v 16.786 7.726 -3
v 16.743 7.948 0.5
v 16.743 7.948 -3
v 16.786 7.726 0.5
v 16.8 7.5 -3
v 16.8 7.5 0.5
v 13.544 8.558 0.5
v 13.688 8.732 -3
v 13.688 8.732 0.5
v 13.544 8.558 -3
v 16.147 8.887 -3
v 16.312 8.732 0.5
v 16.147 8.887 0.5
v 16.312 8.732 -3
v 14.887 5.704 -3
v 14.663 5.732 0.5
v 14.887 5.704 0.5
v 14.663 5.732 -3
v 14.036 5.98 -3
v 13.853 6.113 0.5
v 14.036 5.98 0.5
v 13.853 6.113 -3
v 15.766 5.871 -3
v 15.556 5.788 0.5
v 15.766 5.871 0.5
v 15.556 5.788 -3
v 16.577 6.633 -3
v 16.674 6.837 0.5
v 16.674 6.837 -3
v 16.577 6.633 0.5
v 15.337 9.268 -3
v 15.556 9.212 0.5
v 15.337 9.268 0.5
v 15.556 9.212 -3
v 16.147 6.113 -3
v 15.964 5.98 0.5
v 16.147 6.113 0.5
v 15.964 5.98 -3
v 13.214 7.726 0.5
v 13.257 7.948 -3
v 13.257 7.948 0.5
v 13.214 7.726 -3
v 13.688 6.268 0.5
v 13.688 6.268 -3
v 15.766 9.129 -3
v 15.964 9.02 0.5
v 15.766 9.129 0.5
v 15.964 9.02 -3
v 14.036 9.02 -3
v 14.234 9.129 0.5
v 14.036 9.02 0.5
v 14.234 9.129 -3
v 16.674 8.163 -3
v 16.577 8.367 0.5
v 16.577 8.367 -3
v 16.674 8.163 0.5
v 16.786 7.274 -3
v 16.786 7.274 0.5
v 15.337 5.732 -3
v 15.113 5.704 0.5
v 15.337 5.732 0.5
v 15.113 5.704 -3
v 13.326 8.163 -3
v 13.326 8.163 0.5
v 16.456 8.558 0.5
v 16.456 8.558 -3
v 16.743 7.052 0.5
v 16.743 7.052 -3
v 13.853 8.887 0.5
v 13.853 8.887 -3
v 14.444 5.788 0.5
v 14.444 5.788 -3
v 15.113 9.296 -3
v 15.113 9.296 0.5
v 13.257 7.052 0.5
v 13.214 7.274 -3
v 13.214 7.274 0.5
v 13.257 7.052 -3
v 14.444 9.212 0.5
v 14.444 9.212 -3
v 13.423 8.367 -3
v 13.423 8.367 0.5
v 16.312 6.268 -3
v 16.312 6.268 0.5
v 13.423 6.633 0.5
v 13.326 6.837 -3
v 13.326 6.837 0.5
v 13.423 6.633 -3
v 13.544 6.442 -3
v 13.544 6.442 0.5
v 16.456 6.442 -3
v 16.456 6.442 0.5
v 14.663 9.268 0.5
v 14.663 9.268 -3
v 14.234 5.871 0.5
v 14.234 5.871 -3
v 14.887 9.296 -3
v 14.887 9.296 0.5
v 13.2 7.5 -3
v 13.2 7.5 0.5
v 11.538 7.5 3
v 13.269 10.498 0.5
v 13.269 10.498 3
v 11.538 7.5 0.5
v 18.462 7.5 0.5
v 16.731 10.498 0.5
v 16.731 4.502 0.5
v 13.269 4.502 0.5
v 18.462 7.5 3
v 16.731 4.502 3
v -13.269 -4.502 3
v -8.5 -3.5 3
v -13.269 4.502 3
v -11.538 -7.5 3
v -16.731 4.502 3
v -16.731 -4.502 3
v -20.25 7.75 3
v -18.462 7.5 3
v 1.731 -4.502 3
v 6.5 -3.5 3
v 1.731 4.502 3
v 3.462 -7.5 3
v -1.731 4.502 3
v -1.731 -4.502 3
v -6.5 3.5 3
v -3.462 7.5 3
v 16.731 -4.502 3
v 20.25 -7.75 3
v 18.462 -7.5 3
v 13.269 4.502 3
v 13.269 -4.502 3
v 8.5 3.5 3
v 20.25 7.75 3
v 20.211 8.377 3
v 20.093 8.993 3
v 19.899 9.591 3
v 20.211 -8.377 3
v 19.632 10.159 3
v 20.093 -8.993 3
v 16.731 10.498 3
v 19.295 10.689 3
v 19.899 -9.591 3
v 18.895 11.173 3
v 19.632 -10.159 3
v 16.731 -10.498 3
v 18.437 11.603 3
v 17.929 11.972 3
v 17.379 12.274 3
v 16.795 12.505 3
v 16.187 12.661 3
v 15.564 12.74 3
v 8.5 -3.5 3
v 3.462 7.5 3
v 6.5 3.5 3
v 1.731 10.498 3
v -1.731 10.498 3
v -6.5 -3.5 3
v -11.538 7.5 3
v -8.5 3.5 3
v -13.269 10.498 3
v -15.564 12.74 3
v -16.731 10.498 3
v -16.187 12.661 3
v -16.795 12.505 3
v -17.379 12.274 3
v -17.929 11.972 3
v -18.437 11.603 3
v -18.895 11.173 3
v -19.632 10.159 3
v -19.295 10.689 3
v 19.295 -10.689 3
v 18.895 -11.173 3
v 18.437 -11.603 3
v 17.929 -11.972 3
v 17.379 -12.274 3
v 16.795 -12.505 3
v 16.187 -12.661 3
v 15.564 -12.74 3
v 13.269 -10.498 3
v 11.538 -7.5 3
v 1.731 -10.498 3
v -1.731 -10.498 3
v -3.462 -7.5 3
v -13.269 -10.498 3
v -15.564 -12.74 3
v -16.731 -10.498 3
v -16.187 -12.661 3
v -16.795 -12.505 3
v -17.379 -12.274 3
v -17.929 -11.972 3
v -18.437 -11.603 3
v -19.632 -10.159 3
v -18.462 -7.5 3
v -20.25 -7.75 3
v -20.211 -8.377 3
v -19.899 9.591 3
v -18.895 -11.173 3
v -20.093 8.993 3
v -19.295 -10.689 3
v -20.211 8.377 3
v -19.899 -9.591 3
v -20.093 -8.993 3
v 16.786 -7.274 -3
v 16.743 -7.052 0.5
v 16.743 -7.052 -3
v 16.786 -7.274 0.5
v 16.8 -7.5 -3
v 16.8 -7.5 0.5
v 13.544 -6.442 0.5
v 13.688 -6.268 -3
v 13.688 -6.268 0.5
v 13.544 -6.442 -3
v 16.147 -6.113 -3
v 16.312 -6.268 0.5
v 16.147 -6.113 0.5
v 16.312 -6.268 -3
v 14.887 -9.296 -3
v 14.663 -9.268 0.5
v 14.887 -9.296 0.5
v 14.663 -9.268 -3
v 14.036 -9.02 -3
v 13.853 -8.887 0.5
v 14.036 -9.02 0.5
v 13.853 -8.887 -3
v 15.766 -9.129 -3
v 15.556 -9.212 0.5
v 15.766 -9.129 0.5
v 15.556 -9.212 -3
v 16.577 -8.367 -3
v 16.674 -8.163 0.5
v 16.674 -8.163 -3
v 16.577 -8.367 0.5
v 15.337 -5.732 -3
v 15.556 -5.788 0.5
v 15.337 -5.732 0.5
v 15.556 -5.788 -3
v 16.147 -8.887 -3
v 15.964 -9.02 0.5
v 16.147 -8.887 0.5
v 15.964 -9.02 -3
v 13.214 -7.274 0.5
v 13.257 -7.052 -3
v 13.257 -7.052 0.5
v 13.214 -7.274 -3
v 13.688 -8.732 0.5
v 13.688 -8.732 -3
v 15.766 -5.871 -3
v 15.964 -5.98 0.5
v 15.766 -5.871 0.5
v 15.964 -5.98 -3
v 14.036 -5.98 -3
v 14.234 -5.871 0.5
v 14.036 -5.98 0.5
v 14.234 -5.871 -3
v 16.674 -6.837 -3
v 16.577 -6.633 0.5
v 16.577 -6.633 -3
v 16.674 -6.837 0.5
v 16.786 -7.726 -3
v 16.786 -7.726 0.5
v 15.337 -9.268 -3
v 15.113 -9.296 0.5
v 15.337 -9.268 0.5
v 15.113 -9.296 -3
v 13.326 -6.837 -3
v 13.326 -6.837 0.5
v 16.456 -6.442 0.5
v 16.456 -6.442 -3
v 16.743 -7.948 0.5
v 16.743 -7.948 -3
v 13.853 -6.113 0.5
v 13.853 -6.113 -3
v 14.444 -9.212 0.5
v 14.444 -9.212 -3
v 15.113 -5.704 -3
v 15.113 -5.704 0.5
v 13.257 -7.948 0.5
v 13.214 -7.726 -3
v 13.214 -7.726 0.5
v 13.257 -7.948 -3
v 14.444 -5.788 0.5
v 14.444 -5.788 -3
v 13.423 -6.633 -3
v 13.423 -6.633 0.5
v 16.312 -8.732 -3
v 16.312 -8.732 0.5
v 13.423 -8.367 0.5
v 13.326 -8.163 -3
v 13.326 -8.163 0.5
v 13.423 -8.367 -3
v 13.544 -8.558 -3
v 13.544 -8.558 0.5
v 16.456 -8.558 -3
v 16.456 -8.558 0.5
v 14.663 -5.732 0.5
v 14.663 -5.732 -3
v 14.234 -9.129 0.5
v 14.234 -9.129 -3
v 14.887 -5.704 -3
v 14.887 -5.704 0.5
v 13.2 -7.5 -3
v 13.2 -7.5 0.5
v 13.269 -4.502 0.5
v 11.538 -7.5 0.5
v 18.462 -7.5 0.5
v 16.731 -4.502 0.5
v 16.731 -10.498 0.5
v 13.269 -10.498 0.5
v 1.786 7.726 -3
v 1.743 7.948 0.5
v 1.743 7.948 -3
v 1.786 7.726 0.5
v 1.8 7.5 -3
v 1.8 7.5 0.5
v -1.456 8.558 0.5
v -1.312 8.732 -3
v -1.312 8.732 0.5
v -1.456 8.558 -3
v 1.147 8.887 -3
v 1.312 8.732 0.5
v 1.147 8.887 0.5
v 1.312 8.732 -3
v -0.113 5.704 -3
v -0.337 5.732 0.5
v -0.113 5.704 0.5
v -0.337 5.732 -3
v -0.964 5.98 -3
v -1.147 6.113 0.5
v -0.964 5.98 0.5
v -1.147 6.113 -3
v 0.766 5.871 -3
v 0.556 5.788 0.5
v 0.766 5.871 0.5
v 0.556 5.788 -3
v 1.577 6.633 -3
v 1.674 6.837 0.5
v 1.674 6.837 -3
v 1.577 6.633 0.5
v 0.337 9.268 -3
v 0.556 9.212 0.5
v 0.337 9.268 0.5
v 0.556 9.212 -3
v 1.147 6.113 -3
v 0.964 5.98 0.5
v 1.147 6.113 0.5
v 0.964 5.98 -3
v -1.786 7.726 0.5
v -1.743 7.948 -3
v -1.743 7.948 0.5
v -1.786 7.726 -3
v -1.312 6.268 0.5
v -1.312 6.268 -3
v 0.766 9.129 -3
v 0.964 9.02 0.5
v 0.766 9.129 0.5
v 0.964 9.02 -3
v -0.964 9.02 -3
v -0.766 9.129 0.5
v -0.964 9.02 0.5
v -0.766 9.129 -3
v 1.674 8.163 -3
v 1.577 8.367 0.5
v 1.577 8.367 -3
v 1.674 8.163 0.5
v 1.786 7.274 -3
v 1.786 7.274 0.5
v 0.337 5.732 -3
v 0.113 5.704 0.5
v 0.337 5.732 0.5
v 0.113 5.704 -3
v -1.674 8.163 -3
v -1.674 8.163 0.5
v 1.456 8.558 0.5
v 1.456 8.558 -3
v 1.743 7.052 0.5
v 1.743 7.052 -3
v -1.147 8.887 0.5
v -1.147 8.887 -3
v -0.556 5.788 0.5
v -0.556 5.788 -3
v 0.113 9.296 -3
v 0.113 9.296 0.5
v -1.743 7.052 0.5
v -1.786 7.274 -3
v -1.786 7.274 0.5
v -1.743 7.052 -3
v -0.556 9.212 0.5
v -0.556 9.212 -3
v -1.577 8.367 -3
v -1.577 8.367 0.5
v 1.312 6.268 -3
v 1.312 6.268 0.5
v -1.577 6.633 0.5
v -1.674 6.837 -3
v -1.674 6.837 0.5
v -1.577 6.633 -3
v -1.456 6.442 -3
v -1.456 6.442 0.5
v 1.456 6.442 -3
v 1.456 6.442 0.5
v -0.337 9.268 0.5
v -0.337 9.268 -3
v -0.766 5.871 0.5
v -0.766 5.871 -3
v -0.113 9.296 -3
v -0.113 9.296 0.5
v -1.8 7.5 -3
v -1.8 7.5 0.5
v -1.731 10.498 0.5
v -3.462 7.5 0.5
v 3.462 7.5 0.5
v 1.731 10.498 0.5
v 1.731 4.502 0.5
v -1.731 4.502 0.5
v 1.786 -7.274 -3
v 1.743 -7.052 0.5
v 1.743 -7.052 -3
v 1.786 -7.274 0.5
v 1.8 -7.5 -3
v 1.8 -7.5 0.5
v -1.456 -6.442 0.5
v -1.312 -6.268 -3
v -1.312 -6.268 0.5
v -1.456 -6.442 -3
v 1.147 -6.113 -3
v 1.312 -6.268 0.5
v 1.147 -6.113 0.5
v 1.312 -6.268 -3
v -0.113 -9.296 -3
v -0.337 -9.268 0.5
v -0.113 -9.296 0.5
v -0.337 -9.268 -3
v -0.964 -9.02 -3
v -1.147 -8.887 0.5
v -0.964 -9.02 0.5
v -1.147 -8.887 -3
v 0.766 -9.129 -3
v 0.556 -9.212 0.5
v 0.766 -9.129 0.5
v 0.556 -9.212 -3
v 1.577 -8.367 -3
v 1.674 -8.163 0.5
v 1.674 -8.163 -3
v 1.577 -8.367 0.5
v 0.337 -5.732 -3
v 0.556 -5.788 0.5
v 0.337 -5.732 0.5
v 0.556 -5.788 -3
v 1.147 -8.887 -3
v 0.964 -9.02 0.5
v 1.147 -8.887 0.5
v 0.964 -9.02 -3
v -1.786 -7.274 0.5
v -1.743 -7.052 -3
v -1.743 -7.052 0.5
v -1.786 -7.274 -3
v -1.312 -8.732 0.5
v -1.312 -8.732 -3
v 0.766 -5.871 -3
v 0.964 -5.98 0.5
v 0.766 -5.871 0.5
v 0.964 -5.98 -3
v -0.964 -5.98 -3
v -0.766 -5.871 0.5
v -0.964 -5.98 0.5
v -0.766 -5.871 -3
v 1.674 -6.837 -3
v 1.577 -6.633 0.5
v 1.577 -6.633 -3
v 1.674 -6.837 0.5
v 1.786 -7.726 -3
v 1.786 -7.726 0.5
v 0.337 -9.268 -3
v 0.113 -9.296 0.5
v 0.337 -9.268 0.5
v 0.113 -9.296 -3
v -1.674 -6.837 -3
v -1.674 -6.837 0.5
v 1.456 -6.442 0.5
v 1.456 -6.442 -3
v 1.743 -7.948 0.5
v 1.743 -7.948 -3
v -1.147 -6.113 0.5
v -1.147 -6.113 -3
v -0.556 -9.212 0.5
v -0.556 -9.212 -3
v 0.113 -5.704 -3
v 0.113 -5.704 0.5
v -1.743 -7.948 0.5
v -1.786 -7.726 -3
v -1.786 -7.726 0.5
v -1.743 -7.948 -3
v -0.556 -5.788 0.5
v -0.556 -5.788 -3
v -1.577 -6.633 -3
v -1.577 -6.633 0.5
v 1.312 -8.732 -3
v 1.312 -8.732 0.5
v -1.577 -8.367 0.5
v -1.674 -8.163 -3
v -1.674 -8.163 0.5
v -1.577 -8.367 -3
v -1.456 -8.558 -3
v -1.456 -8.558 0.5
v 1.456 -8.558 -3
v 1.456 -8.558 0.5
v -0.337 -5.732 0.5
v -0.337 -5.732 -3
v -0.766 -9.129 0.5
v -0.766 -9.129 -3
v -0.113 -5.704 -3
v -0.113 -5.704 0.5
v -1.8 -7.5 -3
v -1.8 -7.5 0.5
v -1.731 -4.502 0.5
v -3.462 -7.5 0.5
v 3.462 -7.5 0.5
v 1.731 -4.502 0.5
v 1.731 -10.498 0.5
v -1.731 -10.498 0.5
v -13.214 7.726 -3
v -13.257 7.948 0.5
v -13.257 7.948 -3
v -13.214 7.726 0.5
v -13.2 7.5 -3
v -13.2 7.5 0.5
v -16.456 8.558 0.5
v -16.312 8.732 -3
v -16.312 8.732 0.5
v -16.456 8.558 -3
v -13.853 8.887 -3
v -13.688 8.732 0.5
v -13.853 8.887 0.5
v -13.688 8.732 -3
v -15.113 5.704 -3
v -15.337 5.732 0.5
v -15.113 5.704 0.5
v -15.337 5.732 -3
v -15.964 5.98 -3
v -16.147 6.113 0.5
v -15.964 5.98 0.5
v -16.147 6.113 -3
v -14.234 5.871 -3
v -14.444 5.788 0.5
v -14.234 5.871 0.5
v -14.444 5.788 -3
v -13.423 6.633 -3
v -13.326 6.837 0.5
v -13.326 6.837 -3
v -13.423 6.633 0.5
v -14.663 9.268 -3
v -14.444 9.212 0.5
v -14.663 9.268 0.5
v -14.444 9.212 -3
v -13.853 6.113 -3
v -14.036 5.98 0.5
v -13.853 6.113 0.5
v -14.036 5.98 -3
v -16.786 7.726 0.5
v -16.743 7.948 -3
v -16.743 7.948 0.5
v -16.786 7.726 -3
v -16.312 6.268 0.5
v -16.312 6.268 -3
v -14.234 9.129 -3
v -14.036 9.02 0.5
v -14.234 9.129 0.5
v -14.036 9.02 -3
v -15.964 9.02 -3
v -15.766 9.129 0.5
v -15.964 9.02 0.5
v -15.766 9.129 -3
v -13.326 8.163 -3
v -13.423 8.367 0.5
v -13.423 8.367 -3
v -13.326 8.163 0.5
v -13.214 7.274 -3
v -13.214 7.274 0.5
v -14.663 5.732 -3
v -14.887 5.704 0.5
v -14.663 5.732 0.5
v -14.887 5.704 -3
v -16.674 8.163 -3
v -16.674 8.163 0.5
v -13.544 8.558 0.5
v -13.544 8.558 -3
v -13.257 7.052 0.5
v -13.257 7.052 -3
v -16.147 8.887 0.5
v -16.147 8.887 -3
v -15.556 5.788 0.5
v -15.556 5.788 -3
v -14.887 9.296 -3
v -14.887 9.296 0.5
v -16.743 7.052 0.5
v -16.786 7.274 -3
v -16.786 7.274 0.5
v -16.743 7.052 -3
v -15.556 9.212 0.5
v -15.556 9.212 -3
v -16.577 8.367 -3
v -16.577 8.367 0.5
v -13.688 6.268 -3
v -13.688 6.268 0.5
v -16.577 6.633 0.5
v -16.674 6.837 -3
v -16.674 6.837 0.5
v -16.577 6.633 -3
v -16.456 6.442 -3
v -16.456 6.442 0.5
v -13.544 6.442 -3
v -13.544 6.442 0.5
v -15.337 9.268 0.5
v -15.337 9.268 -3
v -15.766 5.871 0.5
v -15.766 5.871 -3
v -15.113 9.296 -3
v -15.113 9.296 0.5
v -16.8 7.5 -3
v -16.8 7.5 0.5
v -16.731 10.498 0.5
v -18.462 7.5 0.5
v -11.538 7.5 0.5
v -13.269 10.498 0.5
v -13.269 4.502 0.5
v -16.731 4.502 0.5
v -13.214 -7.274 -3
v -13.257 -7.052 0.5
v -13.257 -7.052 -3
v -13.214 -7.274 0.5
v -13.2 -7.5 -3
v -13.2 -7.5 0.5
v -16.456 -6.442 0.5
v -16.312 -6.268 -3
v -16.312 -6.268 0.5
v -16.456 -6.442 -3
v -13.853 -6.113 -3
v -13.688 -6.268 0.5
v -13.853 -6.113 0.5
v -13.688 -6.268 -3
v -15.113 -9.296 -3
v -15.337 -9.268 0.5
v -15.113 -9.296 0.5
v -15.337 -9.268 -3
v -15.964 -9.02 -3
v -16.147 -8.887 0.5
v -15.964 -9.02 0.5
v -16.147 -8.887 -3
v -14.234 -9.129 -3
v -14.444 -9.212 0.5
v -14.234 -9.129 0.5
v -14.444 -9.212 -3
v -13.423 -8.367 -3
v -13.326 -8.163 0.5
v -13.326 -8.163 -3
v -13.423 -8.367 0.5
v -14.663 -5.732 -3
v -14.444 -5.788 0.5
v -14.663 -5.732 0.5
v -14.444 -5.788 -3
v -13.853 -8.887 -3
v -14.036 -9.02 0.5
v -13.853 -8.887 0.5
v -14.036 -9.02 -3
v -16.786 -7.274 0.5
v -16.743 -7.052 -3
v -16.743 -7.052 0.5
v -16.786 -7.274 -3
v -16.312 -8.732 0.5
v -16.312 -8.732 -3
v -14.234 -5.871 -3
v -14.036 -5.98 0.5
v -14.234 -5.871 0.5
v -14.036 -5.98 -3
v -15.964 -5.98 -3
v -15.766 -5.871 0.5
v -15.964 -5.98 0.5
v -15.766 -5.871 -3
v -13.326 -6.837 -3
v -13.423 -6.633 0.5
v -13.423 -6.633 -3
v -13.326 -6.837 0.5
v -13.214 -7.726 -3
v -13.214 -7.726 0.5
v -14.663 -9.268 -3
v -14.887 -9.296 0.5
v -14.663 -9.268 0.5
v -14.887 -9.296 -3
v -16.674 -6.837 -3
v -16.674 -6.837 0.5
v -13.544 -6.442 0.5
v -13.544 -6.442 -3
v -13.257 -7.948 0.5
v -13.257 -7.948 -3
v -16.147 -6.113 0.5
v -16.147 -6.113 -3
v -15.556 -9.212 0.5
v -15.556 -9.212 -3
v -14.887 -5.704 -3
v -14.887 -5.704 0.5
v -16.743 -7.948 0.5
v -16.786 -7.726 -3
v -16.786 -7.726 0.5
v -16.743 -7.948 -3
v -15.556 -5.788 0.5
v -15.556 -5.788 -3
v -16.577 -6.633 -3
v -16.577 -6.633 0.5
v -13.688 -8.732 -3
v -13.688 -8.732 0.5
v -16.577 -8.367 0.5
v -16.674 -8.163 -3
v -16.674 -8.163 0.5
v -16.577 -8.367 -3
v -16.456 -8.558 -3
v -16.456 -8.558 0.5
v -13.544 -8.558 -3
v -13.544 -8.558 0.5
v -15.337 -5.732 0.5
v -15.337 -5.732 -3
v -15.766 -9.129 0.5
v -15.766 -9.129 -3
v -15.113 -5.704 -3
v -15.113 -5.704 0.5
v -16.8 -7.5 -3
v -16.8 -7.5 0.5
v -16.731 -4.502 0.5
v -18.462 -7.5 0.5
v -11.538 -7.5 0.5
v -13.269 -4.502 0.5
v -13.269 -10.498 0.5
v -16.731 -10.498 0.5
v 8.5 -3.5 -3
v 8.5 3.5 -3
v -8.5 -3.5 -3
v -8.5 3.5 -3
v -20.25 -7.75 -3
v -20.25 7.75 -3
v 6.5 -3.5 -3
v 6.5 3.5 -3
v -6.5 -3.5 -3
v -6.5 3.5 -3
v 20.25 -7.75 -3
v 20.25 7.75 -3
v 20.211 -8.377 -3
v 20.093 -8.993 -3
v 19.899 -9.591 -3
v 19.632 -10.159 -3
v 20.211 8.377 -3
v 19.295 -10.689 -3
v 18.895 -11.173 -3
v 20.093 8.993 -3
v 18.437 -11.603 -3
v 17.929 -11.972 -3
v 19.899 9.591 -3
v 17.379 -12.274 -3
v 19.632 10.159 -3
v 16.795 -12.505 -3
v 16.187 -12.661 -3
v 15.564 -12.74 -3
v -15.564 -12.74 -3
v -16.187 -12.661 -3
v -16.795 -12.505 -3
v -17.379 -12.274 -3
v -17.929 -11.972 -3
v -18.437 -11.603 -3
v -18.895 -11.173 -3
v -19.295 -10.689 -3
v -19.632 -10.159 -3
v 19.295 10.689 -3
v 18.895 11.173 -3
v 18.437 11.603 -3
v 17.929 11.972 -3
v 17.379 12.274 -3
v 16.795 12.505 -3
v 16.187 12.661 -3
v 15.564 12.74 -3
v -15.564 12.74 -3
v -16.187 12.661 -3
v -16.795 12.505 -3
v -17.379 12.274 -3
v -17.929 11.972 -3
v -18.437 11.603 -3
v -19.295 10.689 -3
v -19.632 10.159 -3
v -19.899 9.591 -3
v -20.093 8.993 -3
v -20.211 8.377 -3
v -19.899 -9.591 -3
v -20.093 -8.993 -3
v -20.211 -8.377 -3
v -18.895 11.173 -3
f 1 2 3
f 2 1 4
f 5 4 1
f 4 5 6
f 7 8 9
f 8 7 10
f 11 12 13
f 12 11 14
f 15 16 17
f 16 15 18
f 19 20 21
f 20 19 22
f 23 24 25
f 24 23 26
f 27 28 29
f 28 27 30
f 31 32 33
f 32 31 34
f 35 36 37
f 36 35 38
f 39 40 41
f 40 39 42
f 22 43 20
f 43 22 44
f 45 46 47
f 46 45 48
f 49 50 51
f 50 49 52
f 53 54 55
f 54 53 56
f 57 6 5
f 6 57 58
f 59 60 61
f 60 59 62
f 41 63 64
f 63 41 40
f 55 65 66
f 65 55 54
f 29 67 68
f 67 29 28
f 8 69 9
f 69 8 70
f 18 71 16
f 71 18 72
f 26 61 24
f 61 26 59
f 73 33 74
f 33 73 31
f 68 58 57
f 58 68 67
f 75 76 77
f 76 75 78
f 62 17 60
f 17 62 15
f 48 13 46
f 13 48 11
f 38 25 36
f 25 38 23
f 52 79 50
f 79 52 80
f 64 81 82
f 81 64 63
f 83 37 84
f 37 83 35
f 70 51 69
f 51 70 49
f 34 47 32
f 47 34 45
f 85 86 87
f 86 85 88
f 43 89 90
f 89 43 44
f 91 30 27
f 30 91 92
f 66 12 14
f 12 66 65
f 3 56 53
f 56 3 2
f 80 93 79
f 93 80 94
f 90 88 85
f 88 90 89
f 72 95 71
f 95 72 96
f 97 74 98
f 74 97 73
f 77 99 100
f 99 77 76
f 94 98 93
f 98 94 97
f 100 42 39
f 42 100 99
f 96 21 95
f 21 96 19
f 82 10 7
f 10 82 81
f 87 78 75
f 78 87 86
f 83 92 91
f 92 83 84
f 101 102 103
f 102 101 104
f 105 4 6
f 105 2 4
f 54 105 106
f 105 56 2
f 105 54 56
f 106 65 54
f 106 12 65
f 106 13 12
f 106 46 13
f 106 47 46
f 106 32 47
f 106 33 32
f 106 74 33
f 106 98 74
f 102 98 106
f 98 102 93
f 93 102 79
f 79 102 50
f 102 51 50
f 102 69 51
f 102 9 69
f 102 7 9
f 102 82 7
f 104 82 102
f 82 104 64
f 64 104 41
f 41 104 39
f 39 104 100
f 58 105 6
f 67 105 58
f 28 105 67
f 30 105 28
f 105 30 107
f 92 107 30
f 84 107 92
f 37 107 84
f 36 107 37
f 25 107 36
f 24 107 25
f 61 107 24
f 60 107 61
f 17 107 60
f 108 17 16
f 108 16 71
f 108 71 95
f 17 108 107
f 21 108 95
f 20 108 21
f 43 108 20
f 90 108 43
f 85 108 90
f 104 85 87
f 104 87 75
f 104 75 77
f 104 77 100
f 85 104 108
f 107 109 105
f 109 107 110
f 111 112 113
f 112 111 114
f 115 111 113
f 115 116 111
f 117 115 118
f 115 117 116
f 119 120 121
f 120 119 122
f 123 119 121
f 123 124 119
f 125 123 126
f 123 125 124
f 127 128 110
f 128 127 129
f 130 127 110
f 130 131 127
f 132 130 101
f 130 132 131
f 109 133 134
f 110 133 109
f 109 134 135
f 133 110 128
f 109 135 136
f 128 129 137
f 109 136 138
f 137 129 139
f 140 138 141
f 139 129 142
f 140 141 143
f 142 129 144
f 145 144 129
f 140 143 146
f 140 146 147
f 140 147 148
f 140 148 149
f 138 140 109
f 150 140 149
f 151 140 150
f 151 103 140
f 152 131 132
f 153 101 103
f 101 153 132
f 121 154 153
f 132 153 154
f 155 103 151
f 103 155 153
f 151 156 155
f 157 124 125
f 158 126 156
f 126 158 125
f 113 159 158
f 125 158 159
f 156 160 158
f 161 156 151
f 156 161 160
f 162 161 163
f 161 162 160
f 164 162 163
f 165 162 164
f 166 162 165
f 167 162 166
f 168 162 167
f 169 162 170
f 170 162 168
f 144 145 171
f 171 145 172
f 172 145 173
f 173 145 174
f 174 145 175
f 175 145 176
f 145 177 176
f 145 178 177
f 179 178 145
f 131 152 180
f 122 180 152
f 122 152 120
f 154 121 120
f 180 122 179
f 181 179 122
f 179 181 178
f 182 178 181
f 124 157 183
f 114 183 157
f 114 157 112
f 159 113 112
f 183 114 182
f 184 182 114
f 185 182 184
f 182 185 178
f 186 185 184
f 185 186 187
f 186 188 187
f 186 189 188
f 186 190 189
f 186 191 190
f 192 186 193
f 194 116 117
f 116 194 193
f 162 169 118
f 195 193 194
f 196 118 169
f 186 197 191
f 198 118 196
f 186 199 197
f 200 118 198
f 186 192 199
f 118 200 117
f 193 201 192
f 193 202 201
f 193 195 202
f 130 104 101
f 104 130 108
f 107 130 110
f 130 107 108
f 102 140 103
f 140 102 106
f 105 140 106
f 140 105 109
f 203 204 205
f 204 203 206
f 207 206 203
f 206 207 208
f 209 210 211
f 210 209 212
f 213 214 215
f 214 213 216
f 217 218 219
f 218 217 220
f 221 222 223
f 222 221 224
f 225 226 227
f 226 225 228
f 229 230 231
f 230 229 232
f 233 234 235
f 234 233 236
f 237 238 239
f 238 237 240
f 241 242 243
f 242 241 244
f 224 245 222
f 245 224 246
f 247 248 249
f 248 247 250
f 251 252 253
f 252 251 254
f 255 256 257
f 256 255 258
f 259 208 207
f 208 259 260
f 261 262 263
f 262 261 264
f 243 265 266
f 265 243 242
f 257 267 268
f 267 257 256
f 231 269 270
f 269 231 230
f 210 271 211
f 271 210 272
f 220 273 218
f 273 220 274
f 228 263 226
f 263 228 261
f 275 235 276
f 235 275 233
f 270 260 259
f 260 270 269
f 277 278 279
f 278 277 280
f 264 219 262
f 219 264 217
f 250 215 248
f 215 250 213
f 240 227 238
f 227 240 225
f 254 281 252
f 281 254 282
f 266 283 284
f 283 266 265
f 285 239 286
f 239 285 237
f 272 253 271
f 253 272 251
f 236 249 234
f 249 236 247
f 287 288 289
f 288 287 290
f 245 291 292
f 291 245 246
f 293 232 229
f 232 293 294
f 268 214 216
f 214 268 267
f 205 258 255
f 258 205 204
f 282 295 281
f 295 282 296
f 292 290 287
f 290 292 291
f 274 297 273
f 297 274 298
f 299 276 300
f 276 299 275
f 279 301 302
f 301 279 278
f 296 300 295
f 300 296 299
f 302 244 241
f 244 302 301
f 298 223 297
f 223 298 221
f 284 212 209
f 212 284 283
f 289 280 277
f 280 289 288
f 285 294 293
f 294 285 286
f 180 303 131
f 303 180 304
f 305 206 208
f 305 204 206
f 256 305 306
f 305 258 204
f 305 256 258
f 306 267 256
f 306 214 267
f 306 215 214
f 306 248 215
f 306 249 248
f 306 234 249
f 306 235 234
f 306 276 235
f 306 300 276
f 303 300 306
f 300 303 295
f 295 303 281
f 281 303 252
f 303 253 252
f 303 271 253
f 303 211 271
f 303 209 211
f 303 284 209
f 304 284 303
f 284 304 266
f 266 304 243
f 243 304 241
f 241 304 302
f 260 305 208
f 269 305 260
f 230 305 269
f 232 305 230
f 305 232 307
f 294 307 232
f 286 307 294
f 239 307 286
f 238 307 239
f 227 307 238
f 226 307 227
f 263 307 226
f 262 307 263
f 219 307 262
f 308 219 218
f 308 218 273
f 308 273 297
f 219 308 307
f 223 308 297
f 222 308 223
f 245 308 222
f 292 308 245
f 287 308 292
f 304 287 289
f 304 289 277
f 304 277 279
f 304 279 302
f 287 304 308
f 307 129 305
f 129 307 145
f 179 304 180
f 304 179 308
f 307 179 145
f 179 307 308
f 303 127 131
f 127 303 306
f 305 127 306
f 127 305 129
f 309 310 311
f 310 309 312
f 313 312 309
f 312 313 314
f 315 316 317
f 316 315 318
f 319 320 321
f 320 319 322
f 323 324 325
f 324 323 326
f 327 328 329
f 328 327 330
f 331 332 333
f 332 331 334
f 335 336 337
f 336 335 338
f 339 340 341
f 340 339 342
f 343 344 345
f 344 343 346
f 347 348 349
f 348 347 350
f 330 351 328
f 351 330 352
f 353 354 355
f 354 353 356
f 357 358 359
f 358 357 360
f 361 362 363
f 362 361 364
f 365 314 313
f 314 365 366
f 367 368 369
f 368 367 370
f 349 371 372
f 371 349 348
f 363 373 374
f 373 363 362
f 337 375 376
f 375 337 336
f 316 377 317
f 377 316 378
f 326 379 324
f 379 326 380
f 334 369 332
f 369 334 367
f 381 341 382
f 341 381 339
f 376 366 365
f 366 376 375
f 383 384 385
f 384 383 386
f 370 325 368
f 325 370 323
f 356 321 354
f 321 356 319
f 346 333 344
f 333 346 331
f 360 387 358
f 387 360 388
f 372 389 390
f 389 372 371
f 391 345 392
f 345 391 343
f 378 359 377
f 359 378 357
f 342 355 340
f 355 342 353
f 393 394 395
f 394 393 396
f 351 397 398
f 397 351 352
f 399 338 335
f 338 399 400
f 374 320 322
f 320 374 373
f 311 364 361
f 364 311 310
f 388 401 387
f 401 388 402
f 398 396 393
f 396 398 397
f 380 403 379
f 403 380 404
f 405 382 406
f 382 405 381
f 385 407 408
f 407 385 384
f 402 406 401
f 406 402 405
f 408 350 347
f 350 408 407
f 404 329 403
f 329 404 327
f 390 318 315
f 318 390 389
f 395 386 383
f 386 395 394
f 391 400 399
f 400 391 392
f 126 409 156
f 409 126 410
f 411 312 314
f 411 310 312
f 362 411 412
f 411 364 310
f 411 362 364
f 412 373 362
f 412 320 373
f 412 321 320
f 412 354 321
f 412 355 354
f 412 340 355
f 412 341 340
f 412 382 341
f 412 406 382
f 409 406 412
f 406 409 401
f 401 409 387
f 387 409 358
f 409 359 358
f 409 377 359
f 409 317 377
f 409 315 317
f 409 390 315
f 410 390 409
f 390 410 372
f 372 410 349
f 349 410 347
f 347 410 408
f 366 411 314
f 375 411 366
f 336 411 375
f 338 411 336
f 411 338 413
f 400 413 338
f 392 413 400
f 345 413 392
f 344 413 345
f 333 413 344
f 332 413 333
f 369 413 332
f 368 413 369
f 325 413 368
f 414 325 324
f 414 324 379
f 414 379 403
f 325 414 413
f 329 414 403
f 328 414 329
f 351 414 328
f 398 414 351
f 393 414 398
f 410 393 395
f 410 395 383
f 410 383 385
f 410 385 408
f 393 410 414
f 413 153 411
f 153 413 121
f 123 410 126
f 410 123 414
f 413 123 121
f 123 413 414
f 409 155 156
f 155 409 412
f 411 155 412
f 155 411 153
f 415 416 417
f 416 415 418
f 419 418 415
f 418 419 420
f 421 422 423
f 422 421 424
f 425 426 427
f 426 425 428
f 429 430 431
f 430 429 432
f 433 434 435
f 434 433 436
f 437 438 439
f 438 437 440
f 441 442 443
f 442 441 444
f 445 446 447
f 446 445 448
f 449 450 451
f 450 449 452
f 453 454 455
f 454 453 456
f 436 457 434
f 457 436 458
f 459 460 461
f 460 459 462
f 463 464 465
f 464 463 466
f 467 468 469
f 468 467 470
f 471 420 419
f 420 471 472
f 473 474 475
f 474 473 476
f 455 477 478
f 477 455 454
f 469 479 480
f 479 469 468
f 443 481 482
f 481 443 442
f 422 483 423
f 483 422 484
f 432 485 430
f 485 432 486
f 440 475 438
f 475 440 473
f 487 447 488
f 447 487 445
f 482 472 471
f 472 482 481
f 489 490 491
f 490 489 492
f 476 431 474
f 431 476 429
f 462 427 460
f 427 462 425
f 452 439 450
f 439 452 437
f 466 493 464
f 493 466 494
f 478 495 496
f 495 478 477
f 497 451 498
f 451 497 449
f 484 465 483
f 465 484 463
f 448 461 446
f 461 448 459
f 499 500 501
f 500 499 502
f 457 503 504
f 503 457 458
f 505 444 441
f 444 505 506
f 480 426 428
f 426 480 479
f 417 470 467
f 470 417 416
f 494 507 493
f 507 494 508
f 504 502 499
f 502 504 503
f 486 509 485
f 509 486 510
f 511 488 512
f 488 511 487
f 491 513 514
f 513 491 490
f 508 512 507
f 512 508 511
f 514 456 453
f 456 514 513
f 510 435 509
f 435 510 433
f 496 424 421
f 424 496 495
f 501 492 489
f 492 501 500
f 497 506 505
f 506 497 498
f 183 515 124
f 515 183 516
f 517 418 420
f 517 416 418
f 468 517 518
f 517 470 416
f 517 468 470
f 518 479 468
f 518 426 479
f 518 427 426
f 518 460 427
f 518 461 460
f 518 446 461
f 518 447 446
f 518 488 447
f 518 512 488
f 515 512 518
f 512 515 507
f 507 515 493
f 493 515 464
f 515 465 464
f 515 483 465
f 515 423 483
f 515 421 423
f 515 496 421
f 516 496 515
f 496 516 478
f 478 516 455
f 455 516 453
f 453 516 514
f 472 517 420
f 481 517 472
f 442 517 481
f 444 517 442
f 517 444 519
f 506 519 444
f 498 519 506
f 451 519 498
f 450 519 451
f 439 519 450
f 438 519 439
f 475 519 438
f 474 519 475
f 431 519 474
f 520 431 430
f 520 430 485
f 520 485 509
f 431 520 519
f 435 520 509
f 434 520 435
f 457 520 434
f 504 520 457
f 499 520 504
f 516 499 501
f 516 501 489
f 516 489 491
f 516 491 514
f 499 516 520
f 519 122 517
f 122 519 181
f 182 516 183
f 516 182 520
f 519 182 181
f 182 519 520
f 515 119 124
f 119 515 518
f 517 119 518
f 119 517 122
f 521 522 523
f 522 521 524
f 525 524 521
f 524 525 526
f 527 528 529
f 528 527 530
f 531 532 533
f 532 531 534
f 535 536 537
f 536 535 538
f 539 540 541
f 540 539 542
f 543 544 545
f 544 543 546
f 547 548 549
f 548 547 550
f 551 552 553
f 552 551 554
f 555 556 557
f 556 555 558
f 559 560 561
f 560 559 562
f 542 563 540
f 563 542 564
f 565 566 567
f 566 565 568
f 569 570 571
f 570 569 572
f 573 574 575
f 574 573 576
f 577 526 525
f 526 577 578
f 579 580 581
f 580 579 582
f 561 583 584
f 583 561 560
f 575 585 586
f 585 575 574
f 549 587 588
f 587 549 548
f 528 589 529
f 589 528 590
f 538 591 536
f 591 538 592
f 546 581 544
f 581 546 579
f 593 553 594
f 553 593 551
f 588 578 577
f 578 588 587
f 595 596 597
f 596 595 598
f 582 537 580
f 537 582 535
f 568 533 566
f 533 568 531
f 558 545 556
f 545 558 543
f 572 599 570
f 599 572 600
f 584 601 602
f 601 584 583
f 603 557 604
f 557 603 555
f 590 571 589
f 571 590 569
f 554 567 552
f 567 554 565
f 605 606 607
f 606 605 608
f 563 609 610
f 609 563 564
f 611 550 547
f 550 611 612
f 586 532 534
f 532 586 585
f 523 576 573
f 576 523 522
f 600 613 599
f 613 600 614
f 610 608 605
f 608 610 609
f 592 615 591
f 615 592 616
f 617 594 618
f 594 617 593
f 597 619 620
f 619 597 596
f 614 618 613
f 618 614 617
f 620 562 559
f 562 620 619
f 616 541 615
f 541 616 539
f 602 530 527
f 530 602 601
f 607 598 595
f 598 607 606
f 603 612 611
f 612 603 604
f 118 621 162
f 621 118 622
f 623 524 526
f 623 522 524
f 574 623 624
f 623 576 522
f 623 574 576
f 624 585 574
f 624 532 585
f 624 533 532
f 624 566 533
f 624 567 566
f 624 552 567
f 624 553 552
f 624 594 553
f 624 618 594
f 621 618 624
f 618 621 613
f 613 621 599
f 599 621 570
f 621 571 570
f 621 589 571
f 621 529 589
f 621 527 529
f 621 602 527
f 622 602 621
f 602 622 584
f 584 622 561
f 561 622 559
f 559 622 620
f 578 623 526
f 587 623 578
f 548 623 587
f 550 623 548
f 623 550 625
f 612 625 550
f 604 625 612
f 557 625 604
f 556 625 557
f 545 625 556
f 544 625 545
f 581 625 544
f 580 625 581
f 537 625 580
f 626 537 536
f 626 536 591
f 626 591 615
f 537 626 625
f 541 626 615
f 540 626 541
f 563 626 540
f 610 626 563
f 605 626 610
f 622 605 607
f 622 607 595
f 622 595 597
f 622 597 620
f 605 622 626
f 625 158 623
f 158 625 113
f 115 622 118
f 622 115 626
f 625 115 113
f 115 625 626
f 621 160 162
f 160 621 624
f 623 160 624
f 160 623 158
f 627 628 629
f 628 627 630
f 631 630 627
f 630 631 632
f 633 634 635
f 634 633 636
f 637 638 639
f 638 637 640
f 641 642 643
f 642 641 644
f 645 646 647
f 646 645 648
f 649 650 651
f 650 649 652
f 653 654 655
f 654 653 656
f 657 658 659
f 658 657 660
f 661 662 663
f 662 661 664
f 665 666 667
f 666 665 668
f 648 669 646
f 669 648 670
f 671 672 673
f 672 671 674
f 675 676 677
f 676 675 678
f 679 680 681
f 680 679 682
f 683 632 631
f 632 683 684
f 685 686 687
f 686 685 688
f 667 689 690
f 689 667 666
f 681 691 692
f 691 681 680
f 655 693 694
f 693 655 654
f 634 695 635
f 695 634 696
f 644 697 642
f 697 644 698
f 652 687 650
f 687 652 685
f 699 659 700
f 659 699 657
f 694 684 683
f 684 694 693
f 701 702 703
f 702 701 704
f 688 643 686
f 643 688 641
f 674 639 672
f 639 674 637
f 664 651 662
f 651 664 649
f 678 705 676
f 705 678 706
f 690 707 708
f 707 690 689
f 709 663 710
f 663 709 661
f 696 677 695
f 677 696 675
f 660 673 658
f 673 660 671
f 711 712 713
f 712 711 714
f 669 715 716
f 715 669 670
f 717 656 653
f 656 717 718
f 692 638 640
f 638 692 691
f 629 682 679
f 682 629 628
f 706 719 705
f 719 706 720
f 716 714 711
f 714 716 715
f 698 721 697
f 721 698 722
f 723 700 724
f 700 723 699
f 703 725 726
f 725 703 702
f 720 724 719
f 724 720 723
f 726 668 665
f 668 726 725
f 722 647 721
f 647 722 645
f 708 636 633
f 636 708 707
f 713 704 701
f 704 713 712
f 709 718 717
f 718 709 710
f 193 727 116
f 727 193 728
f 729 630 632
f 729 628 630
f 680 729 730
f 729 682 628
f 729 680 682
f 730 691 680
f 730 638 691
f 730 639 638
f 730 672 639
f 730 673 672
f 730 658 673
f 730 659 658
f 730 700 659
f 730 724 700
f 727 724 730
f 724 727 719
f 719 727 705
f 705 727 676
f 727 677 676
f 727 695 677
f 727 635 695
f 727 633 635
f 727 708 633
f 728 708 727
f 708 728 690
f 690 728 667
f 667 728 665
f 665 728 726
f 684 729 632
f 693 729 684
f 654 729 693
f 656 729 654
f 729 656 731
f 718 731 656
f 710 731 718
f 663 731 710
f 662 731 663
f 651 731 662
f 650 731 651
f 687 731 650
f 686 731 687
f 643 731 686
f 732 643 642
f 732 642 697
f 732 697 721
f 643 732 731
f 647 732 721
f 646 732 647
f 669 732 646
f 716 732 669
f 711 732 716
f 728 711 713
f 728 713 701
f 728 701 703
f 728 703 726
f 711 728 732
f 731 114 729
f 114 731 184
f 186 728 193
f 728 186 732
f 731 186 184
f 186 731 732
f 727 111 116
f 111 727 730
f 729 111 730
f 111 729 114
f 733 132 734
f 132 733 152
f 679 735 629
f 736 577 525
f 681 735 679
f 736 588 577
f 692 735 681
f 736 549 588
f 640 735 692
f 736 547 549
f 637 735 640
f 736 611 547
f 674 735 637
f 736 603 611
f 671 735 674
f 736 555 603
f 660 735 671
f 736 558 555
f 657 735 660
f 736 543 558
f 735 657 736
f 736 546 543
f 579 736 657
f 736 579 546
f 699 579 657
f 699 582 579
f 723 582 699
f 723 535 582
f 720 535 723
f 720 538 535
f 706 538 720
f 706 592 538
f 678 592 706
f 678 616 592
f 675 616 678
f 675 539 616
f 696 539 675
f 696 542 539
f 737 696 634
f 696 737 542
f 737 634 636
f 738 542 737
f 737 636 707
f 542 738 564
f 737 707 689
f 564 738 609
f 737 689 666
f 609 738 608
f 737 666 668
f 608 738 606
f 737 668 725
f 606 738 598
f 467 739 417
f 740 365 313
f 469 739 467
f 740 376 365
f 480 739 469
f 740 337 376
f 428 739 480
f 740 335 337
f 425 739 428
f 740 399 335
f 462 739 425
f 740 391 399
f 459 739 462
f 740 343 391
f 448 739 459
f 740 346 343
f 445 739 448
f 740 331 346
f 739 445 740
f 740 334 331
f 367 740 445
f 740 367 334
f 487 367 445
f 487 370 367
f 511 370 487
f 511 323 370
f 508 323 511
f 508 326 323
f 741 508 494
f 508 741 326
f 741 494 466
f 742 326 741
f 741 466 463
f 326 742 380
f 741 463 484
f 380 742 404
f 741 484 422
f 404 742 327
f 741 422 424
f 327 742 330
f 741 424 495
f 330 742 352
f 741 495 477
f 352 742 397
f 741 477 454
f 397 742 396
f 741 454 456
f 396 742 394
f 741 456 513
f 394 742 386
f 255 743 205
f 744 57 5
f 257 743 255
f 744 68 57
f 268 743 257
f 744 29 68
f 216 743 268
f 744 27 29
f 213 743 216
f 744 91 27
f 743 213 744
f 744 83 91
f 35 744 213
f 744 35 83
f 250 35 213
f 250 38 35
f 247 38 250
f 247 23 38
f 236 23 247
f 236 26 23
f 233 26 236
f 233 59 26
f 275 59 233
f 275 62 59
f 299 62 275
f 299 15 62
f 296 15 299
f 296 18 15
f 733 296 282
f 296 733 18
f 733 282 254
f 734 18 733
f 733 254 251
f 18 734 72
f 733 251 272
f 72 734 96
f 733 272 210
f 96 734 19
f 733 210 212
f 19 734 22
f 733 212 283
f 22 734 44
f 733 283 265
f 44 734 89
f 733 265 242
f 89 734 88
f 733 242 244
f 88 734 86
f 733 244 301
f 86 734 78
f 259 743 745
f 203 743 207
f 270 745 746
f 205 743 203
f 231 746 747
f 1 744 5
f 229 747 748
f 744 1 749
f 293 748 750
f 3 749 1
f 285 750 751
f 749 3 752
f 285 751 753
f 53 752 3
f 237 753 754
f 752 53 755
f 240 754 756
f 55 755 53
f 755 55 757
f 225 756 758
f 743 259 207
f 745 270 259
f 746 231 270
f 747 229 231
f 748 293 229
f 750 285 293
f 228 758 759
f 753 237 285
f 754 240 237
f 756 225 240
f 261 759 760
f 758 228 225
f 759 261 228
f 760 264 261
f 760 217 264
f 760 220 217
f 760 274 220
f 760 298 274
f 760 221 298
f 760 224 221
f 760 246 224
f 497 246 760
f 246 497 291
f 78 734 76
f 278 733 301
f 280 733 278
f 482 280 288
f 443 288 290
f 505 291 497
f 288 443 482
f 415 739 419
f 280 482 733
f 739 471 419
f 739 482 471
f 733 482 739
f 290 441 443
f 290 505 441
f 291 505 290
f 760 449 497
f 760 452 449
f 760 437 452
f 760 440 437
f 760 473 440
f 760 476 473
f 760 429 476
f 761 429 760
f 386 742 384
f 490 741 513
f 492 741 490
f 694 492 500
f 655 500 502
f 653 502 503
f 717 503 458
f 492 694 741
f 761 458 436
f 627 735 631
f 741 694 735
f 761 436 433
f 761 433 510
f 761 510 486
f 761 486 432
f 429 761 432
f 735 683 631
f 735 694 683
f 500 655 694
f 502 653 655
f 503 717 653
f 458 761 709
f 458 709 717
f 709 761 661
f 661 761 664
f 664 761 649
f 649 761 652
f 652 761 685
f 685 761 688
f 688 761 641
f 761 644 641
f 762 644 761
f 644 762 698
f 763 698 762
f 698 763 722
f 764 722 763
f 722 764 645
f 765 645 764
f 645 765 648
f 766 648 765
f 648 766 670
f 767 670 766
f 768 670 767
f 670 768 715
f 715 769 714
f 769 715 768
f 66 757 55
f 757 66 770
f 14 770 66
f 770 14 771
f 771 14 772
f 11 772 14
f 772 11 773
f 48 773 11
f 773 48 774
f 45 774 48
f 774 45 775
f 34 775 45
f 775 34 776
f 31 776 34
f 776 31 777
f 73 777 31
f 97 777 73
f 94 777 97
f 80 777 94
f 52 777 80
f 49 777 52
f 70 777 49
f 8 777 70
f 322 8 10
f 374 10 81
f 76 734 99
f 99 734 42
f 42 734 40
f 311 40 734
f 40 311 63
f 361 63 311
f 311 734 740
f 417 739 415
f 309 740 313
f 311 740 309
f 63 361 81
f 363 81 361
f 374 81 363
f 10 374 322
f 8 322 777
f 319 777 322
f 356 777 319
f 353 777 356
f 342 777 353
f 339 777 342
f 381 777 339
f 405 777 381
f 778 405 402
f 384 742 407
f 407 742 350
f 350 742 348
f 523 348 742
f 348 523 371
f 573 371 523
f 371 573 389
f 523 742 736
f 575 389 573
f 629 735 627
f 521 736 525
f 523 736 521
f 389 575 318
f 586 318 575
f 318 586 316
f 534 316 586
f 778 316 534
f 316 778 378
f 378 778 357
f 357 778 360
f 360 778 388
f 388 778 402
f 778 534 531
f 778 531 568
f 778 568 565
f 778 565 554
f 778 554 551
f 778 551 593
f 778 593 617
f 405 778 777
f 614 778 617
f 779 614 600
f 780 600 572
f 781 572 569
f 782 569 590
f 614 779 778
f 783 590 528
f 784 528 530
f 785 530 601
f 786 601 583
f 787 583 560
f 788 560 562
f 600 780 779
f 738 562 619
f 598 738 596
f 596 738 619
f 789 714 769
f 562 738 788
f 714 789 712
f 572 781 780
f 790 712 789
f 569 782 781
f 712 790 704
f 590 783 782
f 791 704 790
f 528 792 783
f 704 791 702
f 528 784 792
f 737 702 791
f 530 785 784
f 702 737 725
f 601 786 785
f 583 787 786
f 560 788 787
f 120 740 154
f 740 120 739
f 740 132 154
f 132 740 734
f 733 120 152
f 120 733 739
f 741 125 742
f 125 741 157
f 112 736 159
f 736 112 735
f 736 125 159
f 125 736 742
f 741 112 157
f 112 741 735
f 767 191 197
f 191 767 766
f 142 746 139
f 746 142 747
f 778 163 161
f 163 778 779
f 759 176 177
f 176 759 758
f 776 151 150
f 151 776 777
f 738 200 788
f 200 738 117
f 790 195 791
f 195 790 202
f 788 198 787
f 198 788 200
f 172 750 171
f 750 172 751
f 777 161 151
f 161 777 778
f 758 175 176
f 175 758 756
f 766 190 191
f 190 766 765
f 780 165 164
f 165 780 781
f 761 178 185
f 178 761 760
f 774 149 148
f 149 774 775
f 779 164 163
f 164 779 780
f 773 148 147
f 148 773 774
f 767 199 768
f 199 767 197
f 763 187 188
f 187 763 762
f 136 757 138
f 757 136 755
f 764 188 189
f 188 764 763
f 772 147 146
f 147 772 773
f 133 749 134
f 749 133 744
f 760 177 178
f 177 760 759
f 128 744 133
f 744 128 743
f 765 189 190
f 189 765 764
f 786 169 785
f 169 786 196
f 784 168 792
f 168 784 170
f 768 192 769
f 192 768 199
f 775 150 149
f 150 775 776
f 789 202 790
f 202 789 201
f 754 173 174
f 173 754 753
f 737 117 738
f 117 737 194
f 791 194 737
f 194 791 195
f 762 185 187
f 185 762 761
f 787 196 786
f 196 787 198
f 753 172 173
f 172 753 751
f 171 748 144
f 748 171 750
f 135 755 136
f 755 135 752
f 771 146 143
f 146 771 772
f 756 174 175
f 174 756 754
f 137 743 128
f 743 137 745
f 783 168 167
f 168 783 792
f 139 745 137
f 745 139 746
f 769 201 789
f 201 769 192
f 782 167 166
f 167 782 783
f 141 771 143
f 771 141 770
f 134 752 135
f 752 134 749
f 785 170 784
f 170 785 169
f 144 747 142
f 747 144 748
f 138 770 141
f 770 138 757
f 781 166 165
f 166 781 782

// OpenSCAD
$fn = 50;


difference() {
	union() {
		*color(alpha = 1.0000000000, c = "gray") {
			translate(v = [0, 14, -3.0000000000]) {
				linear_extrude(height = 1.5000000000) {
					text(font = "Arial:style=Bold", halign = "center", size = 4.5000000000, text = "COMMENT description rounded_rectangle_shape_p_type_0_0_-3.0_pos_timing_belt_clamp_gt2_extra_2.5_width_1.5_height_6_thickness_40.5_25.5_6_size", valign = "center");
				}
			}
		}
		translate(v = [0, 0, -3.0000000000]) {
			hull() {
				translate(v = [-15.2500000000, 7.7500000000, 0]) {
					cylinder(h = 6, r = 5);
				}
				translate(v = [15.2500000000, 7.7500000000, 0]) {
					cylinder(h = 6, r = 5);
				}
				translate(v = [-15.2500000000, -7.7500000000, 0]) {
					cylinder(h = 6, r = 5);
				}
				translate(v = [15.2500000000, -7.7500000000, 0]) {
					cylinder(h = 6, r = 5);
				}
			}
		}
	}
	union() {
		translate(v = [15, 7.5000000000, 3.0000000000]) {
			rotate(a = [0, 0, 0]) {
				difference() {
					union() {
						translate(v = [0, 0, -50.0000000000]) {
							cylinder(h = 100, r = 1.8000000000);
						}
						translate(v = [0, 0, -2.5000000000]) {
							linear_extrude(height = 2.5000000000) {
								polygon(points = [[3.4620000000, 0.0000000000], [1.7310000000, 2.9981799479], [-1.7310000000, 2.9981799479], [-3.4620000000, 0.0000000000], [-1.7310000000, -2.9981799479], [1.7310000000, -2.9981799479]]);
							}
						}
						translate(v = [0, 0, -50.0000000000]) {
							cylinder(h = 100, r = 1.8000000000);
						}
						translate(v = [0, 0, -50.0000000000]) {
							cylinder(h = 100, r = 1.8000000000);
						}
					}
					union();
				}
			}
		}
		translate(v = [15, -7.5000000000, 3.0000000000]) {
			rotate(a = [0, 0, 0]) {
				difference() {
					union() {
						translate(v = [0, 0, -50.0000000000]) {
							cylinder(h = 100, r = 1.8000000000);
						}
						translate(v = [0, 0, -2.5000000000]) {
							linear_extrude(height = 2.5000000000) {
								polygon(points = [[3.4620000000, 0.0000000000], [1.7310000000, 2.9981799479], [-1.7310000000, 2.9981799479], [-3.4620000000, 0.0000000000], [-1.7310000000, -2.9981799479], [1.7310000000, -2.9981799479]]);
							}
						}
						translate(v = [0, 0, -50.0000000000]) {
							cylinder(h = 100, r = 1.8000000000);
						}
						translate(v = [0, 0, -50.0000000000]) {
							cylinder(h = 100, r = 1.8000000000);
						}
					}
					union();
				}
			}
		}
		translate(v = [0, 7.5000000000, 3.0000000000]) {
			rotate(a = [0, 0, 0]) {
				difference() {
					union() {
						translate(v = [0, 0, -50.0000000000]) {
							cylinder(h = 100, r = 1.8000000000);
						}
						translate(v = [0, 0, -2.5000000000]) {
							linear_extrude(height = 2.5000000000) {
								polygon(points = [[3.4620000000, 0.0000000000], [1.7310000000, 2.9981799479], [-1.7310000000, 2.9981799479], [-3.4620000000, 0.0000000000], [-1.7310000000, -2.9981799479], [1.7310000000, -2.9981799479]]);
							}
						}
						translate(v = [0, 0, -50.0000000000]) {
							cylinder(h = 100, r = 1.8000000000);
						}
						translate(v = [0, 0, -50.0000000000]) {
							cylinder(h = 100, r = 1.8000000000);
						}
					}
					union();
				}
			}
		}
		translate(v = [0, -7.5000000000, 3.0000000000]) {
			rotate(a = [0, 0, 0]) {
				difference() {
					union() {
						translate(v = [0, 0, -50.0000000000]) {
							cylinder(h = 100, r = 1.8000000000);
						}
						translate(v = [0, 0, -2.5000000000]) {
							linear_extrude(height = 2.5000000000) {
								polygon(points = [[3.4620000000, 0.0000000000], [1.7310000000, 2.9981799479], [-1.7310000000, 2.9981799479], [-3.4620000000, 0.0000000000], [-1.7310000000, -2.9981799479], [1.7310000000, -2.9981799479]]);
							}
						}
						translate(v = [0, 0, -50.0000000000]) {
							cylinder(h = 100, r = 1.8000000000);
						}
						translate(v = [0, 0, -50.0000000000]) {
							cylinder(h = 100, r = 1.8000000000);
						}
					}
					union();
				}
			}
		}
		translate(v = [-15, 7.5000000000, 3.0000000000]) {
			rotate(a = [0, 0, 0]) {
				difference() {
					union() {
						translate(v = [0, 0, -50.0000000000]) {
							cylinder(h = 100, r = 1.8000000000);
						}
						translate(v = [0, 0, -2.5000000000]) {
							linear_extrude(height = 2.5000000000) {
								polygon(points = [[3.4620000000, 0.0000000000], [1.7310000000, 2.9981799479], [-1.7310000000, 2.9981799479], [-3.4620000000, 0.0000000000], [-1.7310000000, -2.9981799479], [1.7310000000, -2.9981799479]]);
							}
						}
						translate(v = [0, 0, -50.0000000000]) {
							cylinder(h = 100, r = 1.8000000000);
						}
						translate(v = [0, 0, -50.0000000000]) {
							cylinder(h = 100, r = 1.8000000000);
						}
					}
					union();
				}
			}
		}
		translate(v = [-15, -7.5000000000, 3.0000000000]) {
			rotate(a = [0, 0, 0]) {
				difference() {
					union() {
						translate(v = [0, 0, -50.0000000000]) {
							cylinder(h = 100, r = 1.8000000000);
						}
						translate(v = [0, 0, -2.5000000000]) {
							linear_extrude(height = 2.5000000000) {
								polygon(points = [[3.4620000000, 0.0000000000], [1.7310000000, 2.9981799479], [-1.7310000000, 2.9981799479], [-3.4620000000, 0.0000000000], [-1.7310000000, -2.9981799479], [1.7310000000, -2.9981799479]]);
							}
						}
						translate(v = [0, 0, -50.0000000000]) {
							cylinder(h = 100, r = 1.8000000000);
						}
						translate(v = [0, 0, -50.0000000000]) {
							cylinder(h = 100, r = 1.8000000000);
						}
					}
					union();
				}
			}
		}
		*color(alpha = 1.0000000000, c = "gray") {
			translate(v = [15, 21.5000000000, 3.0000000000]) {
				linear_extrude(height = 1.5000000000) {
					text(font = "Arial:style=Bold", halign = "center", size = 4.5000000000, text = "COMMENT description oobb_nut_shape_n_type_m3_radius_name_15_7.5_3.0_pos_timing_belt_clamp_gt2_extra_2.5_width_1.5_height_6_thickness_top_zz_true_hole_0_0_0_rot", valign = "center");
				}
			}
		}
		*color(alpha = 1.0000000000, c = "gray") {
			translate(v = [15, 6.5000000000, 3.0000000000]) {
				linear_extrude(height = 1.5000000000) {
					text(font = "Arial:style=Bold", halign = "center", size = 4.5000000000, text = "COMMENT description oobb_nut_shape_n_type_m3_radius_name_15_-7.5_3.0_pos_timing_belt_clamp_gt2_extra_2.5_width_1.5_height_6_thickness_top_zz_true_hole_0_0_0_rot", valign = "center");
				}
			}
		}
		*color(alpha = 1.0000000000, c = "gray") {
			translate(v = [0, 21.5000000000, 3.0000000000]) {
				linear_extrude(height = 1.5000000000) {
					text(font = "Arial:style=Bold", halign = "center", size = 4.5000000000, text = "COMMENT description oobb_nut_shape_n_type_m3_radius_name_0_7.5_3.0_pos_timing_belt_clamp_gt2_extra_2.5_width_1.5_height_6_thickness_top_zz_true_hole_0_0_0_rot", valign = "center");
				}
			}
		}
		*color(alpha = 1.0000000000, c = "gray") {
			translate(v = [0, 6.5000000000, 3.0000000000]) {
				linear_extrude(height = 1.5000000000) {
					text(font = "Arial:style=Bold", halign = "center", size = 4.5000000000, text = "COMMENT description oobb_nut_shape_n_type_m3_radius_name_0_-7.5_3.0_pos_timing_belt_clamp_gt2_extra_2.5_width_1.5_height_6_thickness_top_zz_true_hole_0_0_0_rot", valign = "center");
				}
			}
		}
		*color(alpha = 1.0000000000, c = "gray") {
			translate(v = [-15, 21.5000000000, 3.0000000000]) {
				linear_extrude(height = 1.5000000000) {
					text(font = "Arial:style=Bold", halign = "center", size = 4.5000000000, text = "COMMENT description oobb_nut_shape_n_type_m3_radius_name_-15_7.5_3.0_pos_timing_belt_clamp_gt2_extra_2.5_width_1.5_height_6_thickness_top_zz_true_hole_0_0_0_rot", valign = "center");
				}
			}
		}
		*color(alpha = 1.0000000000, c = "gray") {
			translate(v = [-15, 6.5000000000, 3.0000000000]) {
				linear_extrude(height = 1.5000000000) {
					text(font = "Arial:style=Bold", halign = "center", size = 4.5000000000, text = "COMMENT description oobb_nut_shape_n_type_m3_radius_name_-15_-7.5_3.0_pos_timing_belt_clamp_gt2_extra_2.5_width_1.5_height_6_thickness_top_zz_true_hole_0_0_0_rot", valign = "center");
				}
			}
		}
		*color(alpha = 1.0000000000, c = "gray") {
			translate(v = [7.5000000000, 14, 0]) {
				linear_extrude(height = 1.5000000000) {
					text(font = "Arial:style=Bold", halign = "center", size = 4.5000000000, text = "COMMENT description oobb_cube_center_shape_n_type_7.5_0_0_pos_timing_belt_clamp_gt2_extra_2.5_width_1.5_height_6_thickness_2_7_6_size_middle_zz", valign = "center");
				}
			}
		}
		#translate(v = [6.5000000000, -3.5000000000, -3.0000000000]) {
			cube(size = [2, 7, 6]);
		}
		*color(alpha = 1.0000000000, c = "gray") {
			translate(v = [-7.5000000000, 14, 0]) {
				linear_extrude(height = 1.5000000000) {
					text(font = "Arial:style=Bold", halign = "center", size = 4.5000000000, text = "COMMENT description oobb_cube_center_shape_n_type_-7.5_0_0_pos_timing_belt_clamp_gt2_extra_2.5_width_1.5_height_6_thickness_2_7_6_size_middle_zz", valign = "center");
				}
			}
		}
		#translate(v = [-8.5000000000, -3.5000000000, -3.0000000000]) {
			cube(size = [2, 7, 6]);
		}
	}
}
